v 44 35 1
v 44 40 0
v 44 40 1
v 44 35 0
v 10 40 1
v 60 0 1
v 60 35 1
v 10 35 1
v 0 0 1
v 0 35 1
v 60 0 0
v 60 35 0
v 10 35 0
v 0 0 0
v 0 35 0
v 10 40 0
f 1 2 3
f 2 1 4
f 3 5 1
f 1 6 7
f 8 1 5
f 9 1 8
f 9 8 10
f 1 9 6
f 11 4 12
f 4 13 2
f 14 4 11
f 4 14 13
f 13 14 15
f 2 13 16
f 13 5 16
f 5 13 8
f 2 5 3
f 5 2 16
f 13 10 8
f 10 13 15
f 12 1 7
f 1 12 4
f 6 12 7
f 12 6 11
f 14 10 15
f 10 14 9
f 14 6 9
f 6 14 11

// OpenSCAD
module chip_card_reader() {
    module switch() {
        cube([6, 10, 1]);
    }
    module reader() {
        width = 11.5;
        height = 21.5;
        translate([10, 35 - height, 0])
        cube([11.5, height, 1]);
    }
    color([1,0,1])
        translate([10, 35, 0])
        cube([34, 5, 1]);
    
    color([1,0,1])
    cube([60, 35, 1]);
    switch();
    reader();
}
chip_card_reader();
